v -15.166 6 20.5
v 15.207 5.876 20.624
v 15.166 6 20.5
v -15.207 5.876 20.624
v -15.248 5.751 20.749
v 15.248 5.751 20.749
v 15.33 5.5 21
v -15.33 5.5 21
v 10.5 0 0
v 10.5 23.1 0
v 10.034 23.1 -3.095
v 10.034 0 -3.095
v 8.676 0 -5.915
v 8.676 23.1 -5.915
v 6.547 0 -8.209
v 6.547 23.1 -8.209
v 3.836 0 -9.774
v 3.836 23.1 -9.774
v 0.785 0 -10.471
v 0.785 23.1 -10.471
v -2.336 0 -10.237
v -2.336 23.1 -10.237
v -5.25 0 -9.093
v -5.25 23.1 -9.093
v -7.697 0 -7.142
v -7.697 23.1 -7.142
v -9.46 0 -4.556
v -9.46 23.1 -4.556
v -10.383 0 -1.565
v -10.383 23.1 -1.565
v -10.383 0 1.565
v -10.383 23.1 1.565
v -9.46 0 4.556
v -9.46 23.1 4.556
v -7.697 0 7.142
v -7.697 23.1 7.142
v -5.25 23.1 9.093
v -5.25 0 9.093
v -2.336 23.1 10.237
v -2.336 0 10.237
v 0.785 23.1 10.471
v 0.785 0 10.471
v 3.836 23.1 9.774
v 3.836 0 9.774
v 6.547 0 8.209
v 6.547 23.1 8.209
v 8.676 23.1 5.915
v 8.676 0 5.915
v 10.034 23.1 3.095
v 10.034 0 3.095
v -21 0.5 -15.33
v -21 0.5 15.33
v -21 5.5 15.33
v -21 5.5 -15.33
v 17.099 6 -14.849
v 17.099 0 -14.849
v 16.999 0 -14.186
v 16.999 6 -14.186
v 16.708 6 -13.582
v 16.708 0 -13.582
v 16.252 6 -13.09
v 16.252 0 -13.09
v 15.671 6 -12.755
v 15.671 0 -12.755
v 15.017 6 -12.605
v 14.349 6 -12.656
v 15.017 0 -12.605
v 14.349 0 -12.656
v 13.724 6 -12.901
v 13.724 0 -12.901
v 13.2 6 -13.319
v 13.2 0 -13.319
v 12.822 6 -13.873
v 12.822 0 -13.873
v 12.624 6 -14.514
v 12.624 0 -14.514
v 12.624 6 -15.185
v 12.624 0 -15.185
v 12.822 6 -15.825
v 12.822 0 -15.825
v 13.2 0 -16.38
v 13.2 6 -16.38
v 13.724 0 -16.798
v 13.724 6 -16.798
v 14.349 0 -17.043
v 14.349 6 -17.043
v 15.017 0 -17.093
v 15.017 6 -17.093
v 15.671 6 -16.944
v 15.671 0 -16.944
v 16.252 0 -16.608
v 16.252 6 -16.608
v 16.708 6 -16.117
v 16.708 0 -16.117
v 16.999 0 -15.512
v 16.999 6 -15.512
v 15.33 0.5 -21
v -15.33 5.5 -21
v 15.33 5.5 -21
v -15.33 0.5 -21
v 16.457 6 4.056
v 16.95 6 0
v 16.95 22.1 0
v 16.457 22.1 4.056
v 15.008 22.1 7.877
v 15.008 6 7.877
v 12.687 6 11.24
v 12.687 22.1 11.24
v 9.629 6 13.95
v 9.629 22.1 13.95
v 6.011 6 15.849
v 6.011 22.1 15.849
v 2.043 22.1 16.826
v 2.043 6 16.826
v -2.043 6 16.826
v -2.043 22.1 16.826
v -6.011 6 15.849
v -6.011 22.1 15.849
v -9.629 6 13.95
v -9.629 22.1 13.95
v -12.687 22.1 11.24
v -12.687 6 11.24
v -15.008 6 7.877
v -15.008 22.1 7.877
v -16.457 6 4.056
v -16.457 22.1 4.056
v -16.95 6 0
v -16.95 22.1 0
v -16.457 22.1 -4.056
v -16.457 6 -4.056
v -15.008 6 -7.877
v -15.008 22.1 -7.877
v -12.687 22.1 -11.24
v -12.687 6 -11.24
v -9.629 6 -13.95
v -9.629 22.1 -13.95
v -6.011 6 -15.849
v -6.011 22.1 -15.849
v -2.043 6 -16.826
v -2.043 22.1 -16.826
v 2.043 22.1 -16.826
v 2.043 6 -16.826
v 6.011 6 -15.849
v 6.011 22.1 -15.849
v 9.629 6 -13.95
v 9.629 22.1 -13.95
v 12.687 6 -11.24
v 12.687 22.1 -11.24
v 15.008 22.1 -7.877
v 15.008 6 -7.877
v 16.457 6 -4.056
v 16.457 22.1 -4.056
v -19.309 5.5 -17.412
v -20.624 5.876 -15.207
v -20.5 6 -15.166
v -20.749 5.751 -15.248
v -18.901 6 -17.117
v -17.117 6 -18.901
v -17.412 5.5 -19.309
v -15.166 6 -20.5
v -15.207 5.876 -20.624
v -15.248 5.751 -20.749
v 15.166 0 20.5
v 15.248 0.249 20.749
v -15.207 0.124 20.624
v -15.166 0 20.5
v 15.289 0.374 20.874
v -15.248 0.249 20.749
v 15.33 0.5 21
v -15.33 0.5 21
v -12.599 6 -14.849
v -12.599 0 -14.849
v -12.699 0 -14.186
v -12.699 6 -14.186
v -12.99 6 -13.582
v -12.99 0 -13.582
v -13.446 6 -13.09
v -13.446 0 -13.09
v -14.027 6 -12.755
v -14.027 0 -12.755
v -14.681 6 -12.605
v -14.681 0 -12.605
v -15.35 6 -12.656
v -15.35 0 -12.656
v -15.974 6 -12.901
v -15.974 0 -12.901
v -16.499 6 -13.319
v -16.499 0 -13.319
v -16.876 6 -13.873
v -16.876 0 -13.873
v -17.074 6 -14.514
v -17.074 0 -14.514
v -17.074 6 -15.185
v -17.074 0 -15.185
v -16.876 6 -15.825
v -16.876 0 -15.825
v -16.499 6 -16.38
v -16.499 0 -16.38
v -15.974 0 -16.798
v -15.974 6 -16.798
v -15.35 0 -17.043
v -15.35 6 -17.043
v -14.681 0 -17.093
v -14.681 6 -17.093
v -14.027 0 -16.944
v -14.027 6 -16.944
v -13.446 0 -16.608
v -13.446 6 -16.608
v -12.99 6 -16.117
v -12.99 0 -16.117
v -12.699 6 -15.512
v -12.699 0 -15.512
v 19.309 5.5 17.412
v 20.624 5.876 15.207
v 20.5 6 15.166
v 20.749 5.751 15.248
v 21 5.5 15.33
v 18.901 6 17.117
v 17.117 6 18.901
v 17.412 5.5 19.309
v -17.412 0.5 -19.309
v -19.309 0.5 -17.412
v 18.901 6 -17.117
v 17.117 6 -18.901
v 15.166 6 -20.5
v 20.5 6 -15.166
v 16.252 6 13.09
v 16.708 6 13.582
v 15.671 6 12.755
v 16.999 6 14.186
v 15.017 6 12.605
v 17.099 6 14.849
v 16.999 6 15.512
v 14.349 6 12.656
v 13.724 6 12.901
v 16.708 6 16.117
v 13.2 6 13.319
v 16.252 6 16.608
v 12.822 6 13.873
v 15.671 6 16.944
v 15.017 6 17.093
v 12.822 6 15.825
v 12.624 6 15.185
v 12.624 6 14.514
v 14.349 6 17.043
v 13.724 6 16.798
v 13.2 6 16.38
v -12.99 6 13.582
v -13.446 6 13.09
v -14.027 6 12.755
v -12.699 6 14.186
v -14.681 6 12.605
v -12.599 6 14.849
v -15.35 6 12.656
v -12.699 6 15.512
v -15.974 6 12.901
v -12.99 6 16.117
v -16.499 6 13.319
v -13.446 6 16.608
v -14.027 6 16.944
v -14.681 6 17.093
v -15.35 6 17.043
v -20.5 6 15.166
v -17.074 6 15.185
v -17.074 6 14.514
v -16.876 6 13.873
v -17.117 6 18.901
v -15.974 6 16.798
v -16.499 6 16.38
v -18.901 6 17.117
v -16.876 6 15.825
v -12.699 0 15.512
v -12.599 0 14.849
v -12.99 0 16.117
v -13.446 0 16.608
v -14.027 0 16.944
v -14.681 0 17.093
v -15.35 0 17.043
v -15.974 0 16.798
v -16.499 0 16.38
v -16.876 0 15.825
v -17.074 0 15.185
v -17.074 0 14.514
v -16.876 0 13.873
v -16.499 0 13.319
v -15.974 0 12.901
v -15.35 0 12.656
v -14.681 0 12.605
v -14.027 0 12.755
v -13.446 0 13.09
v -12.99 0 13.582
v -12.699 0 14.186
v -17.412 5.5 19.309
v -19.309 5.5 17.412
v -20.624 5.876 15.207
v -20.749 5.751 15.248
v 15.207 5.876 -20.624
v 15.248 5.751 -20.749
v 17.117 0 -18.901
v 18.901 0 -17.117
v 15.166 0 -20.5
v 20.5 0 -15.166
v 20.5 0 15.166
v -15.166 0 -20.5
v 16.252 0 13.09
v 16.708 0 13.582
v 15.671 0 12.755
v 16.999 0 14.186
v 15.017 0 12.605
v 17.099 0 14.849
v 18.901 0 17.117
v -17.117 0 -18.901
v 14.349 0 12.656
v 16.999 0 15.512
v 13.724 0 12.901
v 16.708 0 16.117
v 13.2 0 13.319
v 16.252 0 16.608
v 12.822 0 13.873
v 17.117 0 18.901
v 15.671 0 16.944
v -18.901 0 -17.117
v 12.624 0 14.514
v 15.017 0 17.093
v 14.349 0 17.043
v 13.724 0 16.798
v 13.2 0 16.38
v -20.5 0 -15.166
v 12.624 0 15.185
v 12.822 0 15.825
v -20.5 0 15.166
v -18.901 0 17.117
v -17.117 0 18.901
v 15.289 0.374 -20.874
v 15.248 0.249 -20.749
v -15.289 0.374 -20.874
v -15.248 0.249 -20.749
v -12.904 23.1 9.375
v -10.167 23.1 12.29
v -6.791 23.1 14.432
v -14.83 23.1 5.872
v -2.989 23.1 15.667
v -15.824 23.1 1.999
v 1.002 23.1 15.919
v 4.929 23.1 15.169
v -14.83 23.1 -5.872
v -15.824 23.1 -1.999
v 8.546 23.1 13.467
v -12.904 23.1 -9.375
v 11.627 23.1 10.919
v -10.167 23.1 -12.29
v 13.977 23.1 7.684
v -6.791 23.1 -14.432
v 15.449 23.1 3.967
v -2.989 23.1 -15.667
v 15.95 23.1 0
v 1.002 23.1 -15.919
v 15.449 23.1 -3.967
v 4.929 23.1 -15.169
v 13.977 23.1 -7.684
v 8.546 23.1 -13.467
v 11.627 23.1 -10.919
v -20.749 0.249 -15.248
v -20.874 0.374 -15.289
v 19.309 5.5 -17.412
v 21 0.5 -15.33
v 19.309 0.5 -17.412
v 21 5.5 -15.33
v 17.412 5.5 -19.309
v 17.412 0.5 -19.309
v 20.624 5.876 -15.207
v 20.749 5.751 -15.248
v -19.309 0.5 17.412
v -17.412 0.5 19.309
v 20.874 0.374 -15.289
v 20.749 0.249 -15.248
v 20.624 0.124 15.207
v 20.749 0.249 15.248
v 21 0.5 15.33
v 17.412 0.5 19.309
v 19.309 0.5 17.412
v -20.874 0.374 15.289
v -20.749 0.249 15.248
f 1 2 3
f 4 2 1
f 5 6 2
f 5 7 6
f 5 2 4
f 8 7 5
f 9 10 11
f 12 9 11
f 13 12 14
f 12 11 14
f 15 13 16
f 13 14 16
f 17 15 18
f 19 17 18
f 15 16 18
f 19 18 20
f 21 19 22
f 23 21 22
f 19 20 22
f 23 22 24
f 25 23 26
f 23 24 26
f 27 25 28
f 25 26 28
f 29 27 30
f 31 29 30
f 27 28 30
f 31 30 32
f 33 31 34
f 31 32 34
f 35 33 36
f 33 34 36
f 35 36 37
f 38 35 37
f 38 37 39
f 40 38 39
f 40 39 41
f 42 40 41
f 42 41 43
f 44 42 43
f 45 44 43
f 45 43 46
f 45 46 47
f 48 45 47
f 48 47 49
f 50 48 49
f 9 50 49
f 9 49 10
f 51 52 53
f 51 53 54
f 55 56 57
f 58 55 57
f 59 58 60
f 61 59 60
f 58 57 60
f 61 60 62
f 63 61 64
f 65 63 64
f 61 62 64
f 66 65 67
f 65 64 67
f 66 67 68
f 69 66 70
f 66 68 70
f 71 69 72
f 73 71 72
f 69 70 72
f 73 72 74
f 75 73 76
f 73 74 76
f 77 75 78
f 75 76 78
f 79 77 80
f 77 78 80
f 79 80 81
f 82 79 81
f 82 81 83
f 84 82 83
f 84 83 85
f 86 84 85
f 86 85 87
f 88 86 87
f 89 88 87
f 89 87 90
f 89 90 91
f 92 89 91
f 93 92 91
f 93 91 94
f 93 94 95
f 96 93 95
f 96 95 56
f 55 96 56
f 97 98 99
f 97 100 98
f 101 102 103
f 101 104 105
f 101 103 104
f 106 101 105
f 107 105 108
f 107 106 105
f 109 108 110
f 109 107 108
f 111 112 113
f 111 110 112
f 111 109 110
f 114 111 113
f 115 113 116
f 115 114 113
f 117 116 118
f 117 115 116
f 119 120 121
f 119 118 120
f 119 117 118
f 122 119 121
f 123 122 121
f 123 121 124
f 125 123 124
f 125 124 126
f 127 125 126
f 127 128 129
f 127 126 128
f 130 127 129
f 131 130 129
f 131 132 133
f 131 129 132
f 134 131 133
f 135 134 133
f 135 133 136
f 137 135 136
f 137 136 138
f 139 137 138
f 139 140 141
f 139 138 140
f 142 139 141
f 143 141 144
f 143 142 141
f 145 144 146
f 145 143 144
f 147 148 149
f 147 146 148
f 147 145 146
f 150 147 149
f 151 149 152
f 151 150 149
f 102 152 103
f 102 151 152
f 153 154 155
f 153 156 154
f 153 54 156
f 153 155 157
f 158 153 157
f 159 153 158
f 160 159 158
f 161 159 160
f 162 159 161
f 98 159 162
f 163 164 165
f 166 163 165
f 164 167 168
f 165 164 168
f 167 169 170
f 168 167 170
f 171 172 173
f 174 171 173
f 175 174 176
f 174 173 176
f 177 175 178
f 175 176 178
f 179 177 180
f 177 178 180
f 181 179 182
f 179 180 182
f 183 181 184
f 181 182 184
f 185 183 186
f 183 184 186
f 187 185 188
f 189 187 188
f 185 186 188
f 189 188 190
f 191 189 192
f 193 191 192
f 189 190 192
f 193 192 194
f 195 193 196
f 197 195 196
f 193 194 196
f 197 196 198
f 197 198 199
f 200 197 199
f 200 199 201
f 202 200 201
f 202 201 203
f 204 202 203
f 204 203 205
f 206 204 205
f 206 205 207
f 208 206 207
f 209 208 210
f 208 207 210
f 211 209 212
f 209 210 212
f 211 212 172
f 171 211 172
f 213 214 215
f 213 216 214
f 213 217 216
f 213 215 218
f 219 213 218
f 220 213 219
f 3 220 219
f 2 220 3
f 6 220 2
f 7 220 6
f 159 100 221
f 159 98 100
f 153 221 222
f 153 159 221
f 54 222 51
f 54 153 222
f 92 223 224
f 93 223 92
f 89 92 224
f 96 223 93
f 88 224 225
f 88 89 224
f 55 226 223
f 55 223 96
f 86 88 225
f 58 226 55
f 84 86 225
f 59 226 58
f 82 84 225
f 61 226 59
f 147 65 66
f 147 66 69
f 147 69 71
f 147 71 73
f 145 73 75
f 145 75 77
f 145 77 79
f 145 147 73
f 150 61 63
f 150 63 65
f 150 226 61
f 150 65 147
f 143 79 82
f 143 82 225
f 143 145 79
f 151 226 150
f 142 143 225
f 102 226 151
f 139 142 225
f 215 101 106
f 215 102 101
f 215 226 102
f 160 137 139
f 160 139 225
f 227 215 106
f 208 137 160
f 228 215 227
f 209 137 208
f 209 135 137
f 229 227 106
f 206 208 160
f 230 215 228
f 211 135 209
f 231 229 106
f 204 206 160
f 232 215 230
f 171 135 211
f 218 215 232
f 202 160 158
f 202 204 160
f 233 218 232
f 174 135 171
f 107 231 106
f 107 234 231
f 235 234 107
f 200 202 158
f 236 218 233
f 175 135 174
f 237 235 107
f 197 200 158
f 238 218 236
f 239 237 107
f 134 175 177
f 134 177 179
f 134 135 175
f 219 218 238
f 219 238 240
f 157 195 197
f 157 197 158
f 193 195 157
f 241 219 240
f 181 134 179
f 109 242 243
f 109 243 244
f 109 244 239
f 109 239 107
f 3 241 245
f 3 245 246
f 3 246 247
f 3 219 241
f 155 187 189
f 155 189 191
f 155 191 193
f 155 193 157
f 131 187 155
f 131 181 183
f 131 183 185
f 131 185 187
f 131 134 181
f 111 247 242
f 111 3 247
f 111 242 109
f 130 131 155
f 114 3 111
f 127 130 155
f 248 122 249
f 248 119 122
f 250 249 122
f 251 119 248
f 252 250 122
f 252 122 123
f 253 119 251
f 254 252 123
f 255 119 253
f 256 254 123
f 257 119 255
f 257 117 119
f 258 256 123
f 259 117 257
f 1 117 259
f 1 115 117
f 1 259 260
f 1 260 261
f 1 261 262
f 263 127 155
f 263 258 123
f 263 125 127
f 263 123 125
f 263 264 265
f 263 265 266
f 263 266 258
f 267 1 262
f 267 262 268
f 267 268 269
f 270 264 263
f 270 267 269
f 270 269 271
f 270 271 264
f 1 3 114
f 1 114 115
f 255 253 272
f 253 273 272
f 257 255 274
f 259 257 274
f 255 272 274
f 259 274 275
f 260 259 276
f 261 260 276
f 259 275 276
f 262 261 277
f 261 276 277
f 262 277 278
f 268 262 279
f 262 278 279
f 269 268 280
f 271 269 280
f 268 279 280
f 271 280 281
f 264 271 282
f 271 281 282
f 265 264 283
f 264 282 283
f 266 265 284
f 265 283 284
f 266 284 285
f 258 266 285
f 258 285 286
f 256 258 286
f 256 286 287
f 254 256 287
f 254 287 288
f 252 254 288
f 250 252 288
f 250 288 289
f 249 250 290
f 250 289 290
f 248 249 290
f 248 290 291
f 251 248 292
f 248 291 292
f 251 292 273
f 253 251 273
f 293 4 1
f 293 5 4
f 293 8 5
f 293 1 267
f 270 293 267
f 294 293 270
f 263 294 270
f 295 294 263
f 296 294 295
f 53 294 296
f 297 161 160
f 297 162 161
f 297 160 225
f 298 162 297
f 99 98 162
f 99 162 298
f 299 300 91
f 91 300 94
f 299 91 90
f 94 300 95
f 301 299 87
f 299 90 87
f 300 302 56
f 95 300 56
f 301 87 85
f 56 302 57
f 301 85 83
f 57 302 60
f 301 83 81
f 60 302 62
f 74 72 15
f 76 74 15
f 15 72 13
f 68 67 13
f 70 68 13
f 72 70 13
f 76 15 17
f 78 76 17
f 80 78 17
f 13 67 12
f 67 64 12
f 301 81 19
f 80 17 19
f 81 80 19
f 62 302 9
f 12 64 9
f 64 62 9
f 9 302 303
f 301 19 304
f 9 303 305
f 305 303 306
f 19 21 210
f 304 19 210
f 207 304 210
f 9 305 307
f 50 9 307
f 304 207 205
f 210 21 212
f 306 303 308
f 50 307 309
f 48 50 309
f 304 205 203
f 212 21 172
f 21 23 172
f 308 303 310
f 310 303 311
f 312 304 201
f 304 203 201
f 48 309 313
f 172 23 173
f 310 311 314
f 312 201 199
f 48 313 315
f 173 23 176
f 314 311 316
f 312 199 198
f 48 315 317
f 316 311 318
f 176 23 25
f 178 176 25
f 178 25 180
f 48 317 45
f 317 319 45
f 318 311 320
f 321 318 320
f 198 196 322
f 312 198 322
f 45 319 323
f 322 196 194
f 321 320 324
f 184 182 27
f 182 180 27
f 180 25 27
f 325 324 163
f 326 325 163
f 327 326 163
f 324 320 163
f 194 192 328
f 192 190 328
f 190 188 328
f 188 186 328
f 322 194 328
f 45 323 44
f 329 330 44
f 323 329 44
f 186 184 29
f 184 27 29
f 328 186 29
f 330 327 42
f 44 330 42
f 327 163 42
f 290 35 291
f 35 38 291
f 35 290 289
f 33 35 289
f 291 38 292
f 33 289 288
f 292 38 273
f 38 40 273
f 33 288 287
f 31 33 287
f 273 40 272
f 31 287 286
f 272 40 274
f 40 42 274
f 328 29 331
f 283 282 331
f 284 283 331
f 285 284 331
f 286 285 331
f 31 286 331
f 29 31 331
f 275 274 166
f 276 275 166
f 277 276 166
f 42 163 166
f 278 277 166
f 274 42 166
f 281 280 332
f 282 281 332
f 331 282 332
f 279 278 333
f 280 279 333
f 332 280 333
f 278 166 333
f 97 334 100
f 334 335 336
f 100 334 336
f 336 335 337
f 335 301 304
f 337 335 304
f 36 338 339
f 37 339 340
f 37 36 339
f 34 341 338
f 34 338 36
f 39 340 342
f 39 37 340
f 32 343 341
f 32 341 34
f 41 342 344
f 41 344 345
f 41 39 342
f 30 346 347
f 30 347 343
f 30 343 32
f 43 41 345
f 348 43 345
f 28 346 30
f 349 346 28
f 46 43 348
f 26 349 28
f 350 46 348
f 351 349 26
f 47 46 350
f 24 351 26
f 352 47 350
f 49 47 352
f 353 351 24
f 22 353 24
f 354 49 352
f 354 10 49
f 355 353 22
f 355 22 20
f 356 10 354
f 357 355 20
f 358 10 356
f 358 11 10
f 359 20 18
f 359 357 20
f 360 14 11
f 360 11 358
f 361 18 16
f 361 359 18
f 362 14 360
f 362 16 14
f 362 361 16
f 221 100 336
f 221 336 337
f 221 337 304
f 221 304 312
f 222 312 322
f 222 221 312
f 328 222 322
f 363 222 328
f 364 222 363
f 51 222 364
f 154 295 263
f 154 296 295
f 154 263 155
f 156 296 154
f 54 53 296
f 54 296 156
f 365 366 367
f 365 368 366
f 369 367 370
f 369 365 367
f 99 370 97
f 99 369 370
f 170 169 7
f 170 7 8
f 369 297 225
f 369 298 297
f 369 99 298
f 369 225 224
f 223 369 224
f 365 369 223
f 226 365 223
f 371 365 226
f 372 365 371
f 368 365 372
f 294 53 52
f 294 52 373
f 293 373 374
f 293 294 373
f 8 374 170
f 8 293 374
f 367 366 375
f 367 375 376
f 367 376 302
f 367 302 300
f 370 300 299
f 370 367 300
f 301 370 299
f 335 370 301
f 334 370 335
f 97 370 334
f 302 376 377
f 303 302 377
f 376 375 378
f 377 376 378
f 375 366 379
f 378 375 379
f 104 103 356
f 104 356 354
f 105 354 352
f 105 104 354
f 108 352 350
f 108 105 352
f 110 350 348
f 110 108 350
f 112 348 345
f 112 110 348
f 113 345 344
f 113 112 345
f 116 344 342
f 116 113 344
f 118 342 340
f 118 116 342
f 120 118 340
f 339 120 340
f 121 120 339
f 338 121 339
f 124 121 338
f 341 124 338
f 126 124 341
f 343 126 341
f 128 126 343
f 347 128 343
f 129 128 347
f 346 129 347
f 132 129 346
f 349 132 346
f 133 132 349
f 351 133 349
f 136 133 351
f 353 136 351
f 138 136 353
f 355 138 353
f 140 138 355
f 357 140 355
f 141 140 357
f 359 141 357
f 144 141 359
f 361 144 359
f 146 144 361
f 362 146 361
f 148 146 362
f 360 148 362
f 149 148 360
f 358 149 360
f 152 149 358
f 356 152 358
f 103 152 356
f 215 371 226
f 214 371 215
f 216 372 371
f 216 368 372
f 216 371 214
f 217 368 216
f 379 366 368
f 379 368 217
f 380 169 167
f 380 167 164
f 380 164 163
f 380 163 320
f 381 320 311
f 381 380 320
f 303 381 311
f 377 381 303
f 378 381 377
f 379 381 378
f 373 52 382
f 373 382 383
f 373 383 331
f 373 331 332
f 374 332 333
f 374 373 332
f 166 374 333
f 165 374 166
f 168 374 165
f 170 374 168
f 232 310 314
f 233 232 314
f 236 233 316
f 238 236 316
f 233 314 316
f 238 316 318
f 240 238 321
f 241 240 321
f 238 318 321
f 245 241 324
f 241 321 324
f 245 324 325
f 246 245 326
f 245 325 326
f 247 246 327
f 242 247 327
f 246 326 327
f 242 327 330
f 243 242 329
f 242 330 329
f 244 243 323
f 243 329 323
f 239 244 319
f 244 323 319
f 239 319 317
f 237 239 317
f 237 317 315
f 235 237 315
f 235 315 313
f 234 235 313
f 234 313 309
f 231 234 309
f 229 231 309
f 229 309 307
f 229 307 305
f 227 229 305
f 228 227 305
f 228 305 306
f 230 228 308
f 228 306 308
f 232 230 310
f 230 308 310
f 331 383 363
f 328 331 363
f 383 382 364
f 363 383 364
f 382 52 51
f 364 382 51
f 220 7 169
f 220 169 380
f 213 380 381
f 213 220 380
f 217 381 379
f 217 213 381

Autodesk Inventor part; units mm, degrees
ref_plane "YZ Plane" through (0, 0, 0) normal (1, 0, 0) x (0, 1, 0)
ref_plane "XZ Plane" through (0, 0, 0) normal (0, 1, 0) x (-1, 0, 0)
ref_plane "XY Plane" through (0, 0, 0) normal (0, 0, 1) x (1, 0, 0)
sketch "Sketch1" plane through (0, 0, 0) normal (0, 1, 0) x (-1, 0, 0)
  line L0 (21, -21) -> (-21, -21)
  line L1 (-21, -21) -> (-21, 21)
  line L2 (-21, 21) -> (21, 21)
  line L3 (21, 21) -> (21, -21)
  point P0 (0, 0)
  dimension "d3" = 42
  dimension "d4" = 42
extrude "Extrusion1" add sketch "Sketch1" along normal blind 6
sketch "Sketch2" plane through (0, 6, 0) normal (0, 1, 0) x (1, 0, 0)
  circle A0 centre (0, 0) radius 16.95
  dimension "d7" = 33.9
extrude "Extrusion2" add sketch "Sketch2" along normal blind 17.1
sketch "Sketch3" plane through (0, 23.1, 0) normal (0, 1, 0) x (1, 0, 0)
  circle A0 centre (0, 0) radius 10.5
  dimension "d10" = 21
extrude "Extrusion3" cut sketch "Sketch3" against normal blind 76.65
sketch "Sketch4" plane through (0, 6, 0) normal (0, 1, 0) x (1, 0, 0)
  point P0 (0, 0)
sketch "Sketch5" plane through (0, 0, 0) normal (0, -1, 0) x (1, 0, 0)
  line L0 (-21, -21) -> (21, -21) projected
  circle A0 centre (0, 0) radius 10.5 projected
  line L1 (-21, -21) -> (0, 0)
  line L2 (-7.4246, -7.4246) -> (-12.0208, -12.0208)
  line L3 (-12.0208, -12.0208) -> (-17.6777, -17.6777)
  circle A1 centre (-14.8492, -14.8492) radius 4
  circle A2 centre (-14.8492, -14.8492) radius 2.25
  circle A3 centre (14.8492, -14.8492) radius 2.25
  circle A4 centre (14.8492, 14.8492) radius 2.25
  circle A5 centre (-14.8492, 14.8492) radius 2.25
  dimension "d13" = 6.5
  dimension "d14" = 8
  dimension "d15" = 4.5
  dimension "d18" = 360
extrude "Extrusion4" cut sketch "Sketch5" against normal blind 88.15 contours A2 L1 | L1 A2 | A3 | A4 | A5
chamfer "Chamfer1" distance 1 angle 45 1 edges at (-16.95, 23.1, 0)
chamfer "Chamfer2" distance 0.5 angle 45 4 edges at (0, 6, -21) (-21, 6, 0) (0, 6, 21) (21, 6, 0)
sketch "Sketch6" plane through (0, 6, 0) normal (0, 1, 0) x (1, 0, 0)
  line L0 (-20.5, -20.5) -> (-20.5, 20.5) projected
  circle A0 centre (0, 0) radius 15.95 projected
  line L1 (-20.5, 20.5) -> (0, 0)
  circle A1 centre (0, 0) radius 10.5 projected
  line L2 (-7.4246, 7.4246) -> (-18.3848, 18.3848)
  circle A2 centre (0, 0) radius 26
  circle A3 centre (0, 0) radius 31.7761
  dimension "d28" = 15.5
extrude "Extrusion5" cut sketch "Sketch6" against normal blind 219.6 contours L0 L1 A2 | A3
chamfer "Chamfer3" distance 0.5 angle 45 12 edges at (-18.3848, 6, -18.3848) (18.3848, 6, -18.3848) (18.3848, 6, 18.3848) (-18.3848, 6, 18.3848) (-18.3848, 0, -18.3848) (0, 0, -21) (18.3848, 0, -18.3848) (21, 0, 0) (18.3848, 0, 18.3848) (0, 0, 21) (-18.3848, 0, 18.3848) (-21, 0, 0)
properties part number "608ZZ Ball Screw Support Unit"
